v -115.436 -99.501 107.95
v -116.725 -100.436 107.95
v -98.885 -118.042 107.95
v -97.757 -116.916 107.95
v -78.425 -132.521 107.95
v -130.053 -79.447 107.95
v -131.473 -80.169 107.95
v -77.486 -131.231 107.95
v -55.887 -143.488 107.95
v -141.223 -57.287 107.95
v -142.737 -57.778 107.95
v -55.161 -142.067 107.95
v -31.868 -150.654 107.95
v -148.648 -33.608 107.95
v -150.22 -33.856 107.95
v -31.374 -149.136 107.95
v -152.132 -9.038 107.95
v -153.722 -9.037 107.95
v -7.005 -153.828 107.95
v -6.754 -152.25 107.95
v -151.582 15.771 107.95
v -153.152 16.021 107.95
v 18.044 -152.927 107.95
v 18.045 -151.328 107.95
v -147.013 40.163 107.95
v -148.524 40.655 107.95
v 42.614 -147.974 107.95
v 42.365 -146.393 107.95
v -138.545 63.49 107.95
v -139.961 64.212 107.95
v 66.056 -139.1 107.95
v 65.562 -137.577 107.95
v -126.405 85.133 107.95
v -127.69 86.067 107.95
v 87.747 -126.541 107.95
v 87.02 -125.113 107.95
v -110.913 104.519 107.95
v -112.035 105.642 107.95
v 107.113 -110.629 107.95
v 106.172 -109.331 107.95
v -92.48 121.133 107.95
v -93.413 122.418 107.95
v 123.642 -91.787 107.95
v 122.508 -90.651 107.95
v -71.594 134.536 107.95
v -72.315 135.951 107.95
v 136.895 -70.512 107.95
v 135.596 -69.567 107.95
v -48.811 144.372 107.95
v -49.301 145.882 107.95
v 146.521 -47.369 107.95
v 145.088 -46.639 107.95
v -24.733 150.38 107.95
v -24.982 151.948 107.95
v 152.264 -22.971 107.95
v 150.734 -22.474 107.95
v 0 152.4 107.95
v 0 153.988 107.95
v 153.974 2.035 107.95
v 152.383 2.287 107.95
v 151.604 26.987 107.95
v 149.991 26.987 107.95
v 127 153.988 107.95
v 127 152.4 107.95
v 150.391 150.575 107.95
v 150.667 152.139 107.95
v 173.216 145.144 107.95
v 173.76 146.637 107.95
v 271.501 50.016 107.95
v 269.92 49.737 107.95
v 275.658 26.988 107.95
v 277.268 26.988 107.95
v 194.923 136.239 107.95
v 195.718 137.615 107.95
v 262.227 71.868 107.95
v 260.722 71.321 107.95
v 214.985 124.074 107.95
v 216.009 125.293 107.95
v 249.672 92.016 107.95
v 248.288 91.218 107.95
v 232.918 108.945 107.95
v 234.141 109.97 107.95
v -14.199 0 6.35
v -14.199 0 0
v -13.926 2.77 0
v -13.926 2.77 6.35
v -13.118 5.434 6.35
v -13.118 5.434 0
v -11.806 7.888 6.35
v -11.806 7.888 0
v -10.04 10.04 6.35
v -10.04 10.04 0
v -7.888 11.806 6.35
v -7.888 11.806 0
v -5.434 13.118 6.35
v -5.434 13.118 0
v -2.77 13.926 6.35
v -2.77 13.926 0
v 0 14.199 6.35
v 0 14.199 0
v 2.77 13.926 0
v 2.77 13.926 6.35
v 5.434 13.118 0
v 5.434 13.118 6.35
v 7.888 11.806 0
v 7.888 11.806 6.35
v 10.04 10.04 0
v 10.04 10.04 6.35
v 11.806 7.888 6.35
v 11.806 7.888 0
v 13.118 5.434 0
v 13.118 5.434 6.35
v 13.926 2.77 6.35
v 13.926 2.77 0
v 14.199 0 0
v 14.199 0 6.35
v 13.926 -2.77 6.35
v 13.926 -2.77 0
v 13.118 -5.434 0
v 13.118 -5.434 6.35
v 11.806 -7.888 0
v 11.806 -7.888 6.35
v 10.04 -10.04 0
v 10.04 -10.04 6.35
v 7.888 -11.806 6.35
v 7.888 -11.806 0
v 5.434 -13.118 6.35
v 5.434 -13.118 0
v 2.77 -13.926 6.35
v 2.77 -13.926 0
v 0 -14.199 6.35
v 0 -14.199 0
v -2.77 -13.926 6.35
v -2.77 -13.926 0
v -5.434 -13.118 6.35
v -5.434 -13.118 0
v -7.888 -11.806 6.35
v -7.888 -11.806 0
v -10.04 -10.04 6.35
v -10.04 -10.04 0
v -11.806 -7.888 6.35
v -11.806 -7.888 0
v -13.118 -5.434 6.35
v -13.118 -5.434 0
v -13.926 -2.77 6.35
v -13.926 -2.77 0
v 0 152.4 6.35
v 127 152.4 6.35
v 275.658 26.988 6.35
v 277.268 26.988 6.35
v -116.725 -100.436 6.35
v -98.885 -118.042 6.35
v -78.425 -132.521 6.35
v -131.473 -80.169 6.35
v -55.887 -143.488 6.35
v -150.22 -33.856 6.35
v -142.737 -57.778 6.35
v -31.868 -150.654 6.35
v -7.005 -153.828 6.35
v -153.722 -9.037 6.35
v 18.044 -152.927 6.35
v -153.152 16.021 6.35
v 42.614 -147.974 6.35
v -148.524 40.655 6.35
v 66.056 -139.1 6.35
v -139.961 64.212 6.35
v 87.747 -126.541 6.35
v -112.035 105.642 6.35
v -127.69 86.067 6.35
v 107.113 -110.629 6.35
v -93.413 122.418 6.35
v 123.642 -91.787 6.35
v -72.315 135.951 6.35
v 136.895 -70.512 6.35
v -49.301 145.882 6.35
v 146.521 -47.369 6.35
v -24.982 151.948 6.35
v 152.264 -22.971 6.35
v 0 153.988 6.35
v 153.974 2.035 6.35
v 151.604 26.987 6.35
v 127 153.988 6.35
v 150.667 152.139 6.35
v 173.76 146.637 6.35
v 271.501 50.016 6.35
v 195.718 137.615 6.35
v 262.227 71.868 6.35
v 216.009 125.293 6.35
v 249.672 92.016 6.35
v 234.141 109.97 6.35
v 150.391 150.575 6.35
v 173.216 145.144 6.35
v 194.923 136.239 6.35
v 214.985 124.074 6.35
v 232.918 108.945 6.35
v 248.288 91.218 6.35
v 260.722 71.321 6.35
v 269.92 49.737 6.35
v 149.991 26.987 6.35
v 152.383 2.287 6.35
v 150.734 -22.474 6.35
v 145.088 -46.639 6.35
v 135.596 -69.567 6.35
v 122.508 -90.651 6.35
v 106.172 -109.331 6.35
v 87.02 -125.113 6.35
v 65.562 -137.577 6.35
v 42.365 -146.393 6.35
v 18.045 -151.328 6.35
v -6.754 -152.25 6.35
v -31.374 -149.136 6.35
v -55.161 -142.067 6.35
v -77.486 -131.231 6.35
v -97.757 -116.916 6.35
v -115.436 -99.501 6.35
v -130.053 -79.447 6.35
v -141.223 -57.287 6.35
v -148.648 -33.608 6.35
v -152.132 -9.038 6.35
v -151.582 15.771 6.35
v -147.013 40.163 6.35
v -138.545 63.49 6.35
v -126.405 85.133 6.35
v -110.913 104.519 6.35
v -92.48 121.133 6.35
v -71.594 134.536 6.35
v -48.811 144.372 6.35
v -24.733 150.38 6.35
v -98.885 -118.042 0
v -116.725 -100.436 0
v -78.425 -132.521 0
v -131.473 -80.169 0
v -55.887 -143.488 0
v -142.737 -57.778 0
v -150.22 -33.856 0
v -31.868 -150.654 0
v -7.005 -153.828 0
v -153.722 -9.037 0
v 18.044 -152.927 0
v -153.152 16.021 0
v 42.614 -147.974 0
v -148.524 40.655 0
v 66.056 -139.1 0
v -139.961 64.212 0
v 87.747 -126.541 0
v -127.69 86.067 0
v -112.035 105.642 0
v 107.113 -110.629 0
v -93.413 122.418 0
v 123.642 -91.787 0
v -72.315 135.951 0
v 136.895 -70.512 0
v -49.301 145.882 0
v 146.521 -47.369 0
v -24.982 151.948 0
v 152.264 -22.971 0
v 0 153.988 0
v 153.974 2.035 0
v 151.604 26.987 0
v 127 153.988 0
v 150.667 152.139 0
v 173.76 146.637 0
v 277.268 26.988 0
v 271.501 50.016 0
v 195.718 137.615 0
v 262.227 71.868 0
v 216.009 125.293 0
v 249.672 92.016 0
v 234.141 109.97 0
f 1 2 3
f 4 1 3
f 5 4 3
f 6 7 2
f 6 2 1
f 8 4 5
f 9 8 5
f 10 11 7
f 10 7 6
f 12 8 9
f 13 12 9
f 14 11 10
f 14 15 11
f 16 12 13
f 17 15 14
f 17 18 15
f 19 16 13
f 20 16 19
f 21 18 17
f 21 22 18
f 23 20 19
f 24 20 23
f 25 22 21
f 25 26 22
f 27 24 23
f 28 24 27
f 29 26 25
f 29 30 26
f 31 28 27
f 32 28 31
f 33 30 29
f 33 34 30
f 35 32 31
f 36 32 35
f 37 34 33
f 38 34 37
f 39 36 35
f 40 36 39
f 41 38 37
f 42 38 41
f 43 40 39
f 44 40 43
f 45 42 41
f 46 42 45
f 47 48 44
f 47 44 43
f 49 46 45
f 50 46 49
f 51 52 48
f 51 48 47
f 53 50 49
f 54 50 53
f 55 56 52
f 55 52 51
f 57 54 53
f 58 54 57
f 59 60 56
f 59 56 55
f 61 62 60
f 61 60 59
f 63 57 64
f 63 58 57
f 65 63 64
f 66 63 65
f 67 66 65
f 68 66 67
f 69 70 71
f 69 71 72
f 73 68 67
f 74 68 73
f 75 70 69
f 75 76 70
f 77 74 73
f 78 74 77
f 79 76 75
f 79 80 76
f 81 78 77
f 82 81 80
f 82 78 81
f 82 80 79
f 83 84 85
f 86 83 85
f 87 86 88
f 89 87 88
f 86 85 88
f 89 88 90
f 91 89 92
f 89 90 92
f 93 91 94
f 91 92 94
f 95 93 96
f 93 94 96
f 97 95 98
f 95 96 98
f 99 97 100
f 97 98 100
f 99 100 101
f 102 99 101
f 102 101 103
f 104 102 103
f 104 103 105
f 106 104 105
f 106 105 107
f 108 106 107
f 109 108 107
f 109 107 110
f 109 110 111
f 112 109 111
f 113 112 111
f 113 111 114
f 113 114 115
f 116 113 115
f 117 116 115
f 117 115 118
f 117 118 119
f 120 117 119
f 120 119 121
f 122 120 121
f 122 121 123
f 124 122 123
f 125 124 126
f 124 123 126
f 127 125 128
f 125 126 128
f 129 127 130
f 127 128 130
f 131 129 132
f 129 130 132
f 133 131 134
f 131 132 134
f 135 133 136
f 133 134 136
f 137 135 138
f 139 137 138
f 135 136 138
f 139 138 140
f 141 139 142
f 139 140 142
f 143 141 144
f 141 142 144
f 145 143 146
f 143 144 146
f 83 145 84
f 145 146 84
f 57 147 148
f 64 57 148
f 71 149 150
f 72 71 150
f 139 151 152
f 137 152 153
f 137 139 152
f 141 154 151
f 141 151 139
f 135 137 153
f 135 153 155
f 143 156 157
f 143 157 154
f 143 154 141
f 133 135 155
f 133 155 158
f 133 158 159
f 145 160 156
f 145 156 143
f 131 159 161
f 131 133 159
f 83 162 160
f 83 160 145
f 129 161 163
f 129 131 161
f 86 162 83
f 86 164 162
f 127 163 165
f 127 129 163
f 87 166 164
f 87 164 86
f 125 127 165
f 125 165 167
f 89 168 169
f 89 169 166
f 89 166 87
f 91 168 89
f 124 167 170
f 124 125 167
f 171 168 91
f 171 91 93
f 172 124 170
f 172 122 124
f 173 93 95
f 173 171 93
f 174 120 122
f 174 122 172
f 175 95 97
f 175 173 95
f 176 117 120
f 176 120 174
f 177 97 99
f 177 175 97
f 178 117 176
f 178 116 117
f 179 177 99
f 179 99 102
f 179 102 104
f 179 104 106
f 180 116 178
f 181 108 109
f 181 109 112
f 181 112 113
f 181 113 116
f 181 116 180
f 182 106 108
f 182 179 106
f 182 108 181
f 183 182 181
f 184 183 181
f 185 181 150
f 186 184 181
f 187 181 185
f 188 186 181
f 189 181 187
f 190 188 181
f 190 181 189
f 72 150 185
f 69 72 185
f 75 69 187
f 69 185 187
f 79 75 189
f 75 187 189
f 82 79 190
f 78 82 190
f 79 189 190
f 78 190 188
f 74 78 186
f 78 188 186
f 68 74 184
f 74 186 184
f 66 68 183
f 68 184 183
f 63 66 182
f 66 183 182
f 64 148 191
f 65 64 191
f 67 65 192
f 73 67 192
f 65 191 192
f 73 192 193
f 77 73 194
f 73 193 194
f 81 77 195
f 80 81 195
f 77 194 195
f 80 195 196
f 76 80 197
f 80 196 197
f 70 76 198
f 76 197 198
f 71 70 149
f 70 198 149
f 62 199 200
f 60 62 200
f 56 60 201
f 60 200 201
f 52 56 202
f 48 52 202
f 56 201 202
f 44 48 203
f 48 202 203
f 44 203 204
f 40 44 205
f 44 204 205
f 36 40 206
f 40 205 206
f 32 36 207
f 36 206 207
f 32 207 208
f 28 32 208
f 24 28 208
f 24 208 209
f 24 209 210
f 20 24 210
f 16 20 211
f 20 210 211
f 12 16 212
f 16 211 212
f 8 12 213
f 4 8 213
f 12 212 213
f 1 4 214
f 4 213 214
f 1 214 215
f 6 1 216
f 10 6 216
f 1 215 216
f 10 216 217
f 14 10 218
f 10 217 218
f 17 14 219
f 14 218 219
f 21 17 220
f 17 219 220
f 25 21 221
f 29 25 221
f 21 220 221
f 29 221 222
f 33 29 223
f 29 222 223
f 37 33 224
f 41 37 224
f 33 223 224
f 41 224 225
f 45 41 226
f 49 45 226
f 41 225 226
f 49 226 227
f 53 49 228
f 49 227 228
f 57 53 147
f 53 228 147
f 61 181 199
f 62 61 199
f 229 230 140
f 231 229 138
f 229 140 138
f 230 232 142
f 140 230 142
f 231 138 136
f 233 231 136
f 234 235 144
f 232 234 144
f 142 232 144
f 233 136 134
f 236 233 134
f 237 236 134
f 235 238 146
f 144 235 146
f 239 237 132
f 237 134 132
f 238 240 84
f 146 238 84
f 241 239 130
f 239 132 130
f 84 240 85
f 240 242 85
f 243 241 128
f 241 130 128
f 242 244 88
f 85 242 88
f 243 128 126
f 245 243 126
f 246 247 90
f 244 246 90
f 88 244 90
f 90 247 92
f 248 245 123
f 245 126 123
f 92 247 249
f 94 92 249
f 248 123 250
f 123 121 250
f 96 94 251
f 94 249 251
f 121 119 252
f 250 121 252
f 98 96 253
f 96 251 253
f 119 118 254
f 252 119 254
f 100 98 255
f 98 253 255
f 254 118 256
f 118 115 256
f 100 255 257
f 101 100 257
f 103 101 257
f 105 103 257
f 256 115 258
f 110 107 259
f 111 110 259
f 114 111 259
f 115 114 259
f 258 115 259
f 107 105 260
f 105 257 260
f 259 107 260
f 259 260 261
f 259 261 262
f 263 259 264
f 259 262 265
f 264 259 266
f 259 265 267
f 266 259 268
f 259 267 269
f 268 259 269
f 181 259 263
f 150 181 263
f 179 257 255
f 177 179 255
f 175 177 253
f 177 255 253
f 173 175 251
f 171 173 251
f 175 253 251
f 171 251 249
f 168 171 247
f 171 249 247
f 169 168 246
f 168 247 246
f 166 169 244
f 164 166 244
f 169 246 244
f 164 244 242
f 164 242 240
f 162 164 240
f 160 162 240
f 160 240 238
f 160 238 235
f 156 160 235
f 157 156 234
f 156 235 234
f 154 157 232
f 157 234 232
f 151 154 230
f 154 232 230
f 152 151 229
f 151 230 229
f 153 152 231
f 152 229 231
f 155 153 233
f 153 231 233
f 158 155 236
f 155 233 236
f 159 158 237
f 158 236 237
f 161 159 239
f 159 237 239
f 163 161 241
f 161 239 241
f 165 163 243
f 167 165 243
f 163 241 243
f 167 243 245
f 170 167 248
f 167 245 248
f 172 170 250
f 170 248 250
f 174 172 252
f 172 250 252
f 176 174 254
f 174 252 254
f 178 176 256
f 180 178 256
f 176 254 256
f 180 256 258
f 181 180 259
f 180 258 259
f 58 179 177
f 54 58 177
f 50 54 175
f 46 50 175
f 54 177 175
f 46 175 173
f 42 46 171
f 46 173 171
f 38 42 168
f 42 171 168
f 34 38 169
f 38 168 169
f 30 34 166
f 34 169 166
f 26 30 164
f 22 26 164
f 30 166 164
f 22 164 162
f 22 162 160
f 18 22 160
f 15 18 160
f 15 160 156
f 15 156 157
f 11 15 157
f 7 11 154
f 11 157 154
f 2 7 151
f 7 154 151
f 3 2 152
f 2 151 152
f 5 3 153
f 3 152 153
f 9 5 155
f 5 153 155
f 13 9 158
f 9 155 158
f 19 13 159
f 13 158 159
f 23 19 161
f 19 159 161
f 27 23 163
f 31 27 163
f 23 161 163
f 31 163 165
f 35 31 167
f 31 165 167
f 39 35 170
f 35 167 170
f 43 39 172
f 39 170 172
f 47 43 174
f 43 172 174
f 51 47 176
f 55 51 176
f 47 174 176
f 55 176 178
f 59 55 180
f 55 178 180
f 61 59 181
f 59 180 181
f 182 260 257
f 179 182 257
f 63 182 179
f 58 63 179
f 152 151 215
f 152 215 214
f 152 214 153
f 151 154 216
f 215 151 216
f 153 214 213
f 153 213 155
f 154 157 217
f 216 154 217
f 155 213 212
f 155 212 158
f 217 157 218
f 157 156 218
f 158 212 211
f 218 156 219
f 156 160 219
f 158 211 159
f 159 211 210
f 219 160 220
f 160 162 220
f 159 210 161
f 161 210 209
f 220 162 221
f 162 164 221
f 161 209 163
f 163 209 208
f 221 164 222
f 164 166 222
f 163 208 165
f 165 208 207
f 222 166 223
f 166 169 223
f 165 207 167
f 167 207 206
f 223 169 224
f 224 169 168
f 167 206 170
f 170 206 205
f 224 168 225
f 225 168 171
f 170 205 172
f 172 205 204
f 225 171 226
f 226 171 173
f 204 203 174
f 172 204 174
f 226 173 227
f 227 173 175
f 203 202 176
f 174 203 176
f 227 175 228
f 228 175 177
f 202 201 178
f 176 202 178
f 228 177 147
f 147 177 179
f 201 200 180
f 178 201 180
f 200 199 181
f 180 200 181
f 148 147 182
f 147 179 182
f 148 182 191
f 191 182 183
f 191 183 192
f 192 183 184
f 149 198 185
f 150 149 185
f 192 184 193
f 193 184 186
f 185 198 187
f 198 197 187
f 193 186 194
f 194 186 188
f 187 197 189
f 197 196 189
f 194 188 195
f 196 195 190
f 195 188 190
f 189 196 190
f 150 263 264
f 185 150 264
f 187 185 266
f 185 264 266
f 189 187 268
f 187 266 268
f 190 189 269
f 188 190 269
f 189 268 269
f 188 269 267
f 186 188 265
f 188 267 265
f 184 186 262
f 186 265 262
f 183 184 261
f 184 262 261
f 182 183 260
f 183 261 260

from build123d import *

# Parameters (mm, degrees)
F1_DEPTH = 6.35
F3_D     = 28.3972
F5_DEPTH = 101.6


with BuildPart() as f1:
    # F0 (on Top) → F1 (new body)
    with BuildSketch(Plane.XY):
        with BuildLine():
            Line((127, 153.9875), (0, 153.9875))
            ThreePointArc((0, 153.9875), (-98.884813, -118.042128), (151.604172, 26.9875))
            Line((151.604172, 26.9875), (277.268426, 26.9875))
            ThreePointArc((277.268426, 26.9875), (225.373777, 117.984923), (127, 153.9875))
        make_face()
    extrude(amount=F1_DEPTH)

    # F3 (through all)
    with Locations(Plane.XY.offset(6.35)):
        with Locations((0, 0)):
            Hole(F3_D / 2)


with BuildPart() as f5:
    # F4 (on face) → F5 (new body)
    with BuildSketch(Plane.XY.offset(6.35)):
        with BuildLine():
            ThreePointArc((149.991449, 26.9875), (-97.757007, -116.915899), (0, 152.4))
            Line((0, 152.4), (127, 152.4))
            ThreePointArc((127, 152.4), (224.246523, 116.859022), (275.658165, 26.9875))
            Line((275.658165, 26.9875), (277.268426, 26.9875))
            ThreePointArc((277.268426, 26.9875), (225.373777, 117.984923), (127, 153.9875))
            Line((127, 153.9875), (0, 153.9875))
            ThreePointArc((0, 153.9875), (-98.884813, -118.042128), (151.604172, 26.9875))
            Line((151.604172, 26.9875), (149.991449, 26.9875))
        make_face()
    extrude(amount=F5_DEPTH)


solid = Compound([f1.part, f5.part])
